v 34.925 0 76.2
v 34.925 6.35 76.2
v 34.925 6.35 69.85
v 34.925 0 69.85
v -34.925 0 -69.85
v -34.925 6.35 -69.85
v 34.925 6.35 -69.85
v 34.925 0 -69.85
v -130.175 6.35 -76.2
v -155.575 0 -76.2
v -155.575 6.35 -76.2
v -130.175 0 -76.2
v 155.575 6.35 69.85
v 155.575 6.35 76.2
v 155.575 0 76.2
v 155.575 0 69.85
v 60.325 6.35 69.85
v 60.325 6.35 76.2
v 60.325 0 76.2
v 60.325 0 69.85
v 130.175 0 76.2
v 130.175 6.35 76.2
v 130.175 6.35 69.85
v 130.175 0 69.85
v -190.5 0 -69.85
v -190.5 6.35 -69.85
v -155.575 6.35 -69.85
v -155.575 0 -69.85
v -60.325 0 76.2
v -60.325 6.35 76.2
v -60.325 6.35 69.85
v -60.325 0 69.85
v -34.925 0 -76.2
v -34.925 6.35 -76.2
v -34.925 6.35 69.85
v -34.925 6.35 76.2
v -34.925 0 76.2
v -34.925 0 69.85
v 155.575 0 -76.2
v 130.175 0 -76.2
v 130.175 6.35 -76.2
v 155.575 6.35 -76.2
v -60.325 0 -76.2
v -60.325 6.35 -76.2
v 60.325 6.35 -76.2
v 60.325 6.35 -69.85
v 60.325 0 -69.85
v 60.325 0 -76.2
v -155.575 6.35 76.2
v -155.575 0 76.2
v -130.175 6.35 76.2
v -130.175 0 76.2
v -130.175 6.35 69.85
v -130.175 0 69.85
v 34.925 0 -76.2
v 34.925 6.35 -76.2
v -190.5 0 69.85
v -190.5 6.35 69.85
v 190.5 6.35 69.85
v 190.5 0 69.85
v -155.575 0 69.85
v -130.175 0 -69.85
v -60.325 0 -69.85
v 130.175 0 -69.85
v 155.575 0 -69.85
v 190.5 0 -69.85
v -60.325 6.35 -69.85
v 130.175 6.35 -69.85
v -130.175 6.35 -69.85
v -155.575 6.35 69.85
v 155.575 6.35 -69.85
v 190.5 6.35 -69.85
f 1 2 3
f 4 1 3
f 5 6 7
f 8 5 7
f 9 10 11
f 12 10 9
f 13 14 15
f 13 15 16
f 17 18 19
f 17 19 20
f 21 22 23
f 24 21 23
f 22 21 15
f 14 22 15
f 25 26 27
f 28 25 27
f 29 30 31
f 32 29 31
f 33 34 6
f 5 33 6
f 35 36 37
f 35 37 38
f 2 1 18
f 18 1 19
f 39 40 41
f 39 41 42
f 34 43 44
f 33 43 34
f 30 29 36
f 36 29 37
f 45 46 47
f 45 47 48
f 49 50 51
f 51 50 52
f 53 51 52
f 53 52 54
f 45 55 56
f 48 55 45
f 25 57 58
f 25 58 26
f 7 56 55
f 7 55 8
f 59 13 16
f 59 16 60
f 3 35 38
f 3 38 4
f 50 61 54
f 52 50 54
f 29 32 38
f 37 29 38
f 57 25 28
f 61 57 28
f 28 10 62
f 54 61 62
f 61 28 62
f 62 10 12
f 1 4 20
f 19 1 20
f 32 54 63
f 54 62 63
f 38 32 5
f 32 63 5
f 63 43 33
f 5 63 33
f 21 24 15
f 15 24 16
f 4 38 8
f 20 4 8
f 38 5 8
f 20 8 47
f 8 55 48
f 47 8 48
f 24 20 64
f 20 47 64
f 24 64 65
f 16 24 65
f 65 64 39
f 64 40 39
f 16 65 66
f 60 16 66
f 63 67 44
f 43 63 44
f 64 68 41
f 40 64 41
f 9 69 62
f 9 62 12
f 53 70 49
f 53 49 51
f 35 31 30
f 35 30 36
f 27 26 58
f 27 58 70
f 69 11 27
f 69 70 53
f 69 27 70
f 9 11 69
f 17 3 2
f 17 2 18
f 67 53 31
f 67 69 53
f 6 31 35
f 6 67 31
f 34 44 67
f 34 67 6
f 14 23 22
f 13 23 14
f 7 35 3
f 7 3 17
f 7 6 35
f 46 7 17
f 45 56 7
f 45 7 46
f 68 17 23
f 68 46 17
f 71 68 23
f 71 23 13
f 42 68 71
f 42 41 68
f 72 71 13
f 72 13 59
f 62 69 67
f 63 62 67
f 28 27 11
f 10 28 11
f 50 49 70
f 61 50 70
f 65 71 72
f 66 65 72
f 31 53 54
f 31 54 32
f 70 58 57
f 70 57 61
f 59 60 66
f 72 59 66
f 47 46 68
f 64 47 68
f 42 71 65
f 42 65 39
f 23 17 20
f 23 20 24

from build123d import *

# Parameters (mm, degrees)
SKETCH1_W               = 381
SKETCH1_H               = 152.4
BOSS_EXTRUDE1_DEPTH     = 6.35
SKETCH2_W               = 69.85
SKETCH2_H               = 6.35
CUT_EXTRUDE2_DEPTH      = 7.35
LPATTERN1_COUNT         = 3
LPATTERN1_PITCH         = 95.25
LPATTERN1_COL_COUNT     = 3
LPATTERN1_COL_PITCH     = 95.25
MIRROR2_COPY_1_SKETCH_W = 69.85
MIRROR2_COPY_1_SKETCH_H = 6.35
MIRROR2_COPY_1_DEPTH    = 7.35
MIRROR2_COPY_2_SKETCH_W = 69.85
MIRROR2_COPY_2_SKETCH_H = 6.35
MIRROR2_COPY_2_DEPTH    = 7.35
MIRROR2_COPY_3_SKETCH_W = 69.85
MIRROR2_COPY_3_SKETCH_H = 6.35
MIRROR2_COPY_3_DEPTH    = 7.35
MIRROR2_COPY_4_SKETCH_W = 69.85
MIRROR2_COPY_4_SKETCH_H = 6.35
MIRROR2_COPY_4_DEPTH    = 7.35


with BuildPart() as part:
    # Sketch1 → Boss-Extrude1 (new body)
    with BuildSketch(Plane(origin=(0, 0, 0), x_dir=(1, 0, 0), z_dir=(0, 1, 0))):
        Rectangle(SKETCH1_W, SKETCH1_H)
    extrude(amount=BOSS_EXTRUDE1_DEPTH)

    # Sketch2 → Cut-Extrude2 (cut, through all)
    with BuildSketch(Plane(origin=(0, 6.35, 0), x_dir=(1, 0, 0), z_dir=(0, 1, 0))):
        with Locations((0, -73.025)):
            Rectangle(SKETCH2_W, SKETCH2_H)
    cut_extrude2 = extrude(amount=-CUT_EXTRUDE2_DEPTH, mode=Mode.SUBTRACT)

    # LPattern1: Cut-Extrude2 ×3
    with Locations(*[(-i * LPATTERN1_PITCH, 0, 0) for i in range(1, LPATTERN1_COUNT)]):
        add(cut_extrude2, mode=Mode.SUBTRACT)

    # LPattern1 col: Cut-Extrude2 ×3
    with Locations(*[(i * LPATTERN1_COL_PITCH, 0, 0) for i in range(1, LPATTERN1_COL_COUNT)]):
        add(cut_extrude2, mode=Mode.SUBTRACT)

    # Mirror2: Cut-Extrude2 across plane
    add(cut_extrude2.mirror(Plane.XY), mode=Mode.SUBTRACT)

    # Mirror2 copy 1 sketch → Mirror2 copy 1 (cut, through all)
    with BuildSketch(Plane(origin=(-95.25, 6.35, 0), x_dir=(1, 0, 0), z_dir=(0, 1, 0))):
        with Locations((0, 73.025)):
            Rectangle(MIRROR2_COPY_1_SKETCH_W, MIRROR2_COPY_1_SKETCH_H)
    extrude(amount=-MIRROR2_COPY_1_DEPTH, mode=Mode.SUBTRACT)

    # Mirror2 copy 2 sketch → Mirror2 copy 2 (cut, through all)
    with BuildSketch(Plane(origin=(-190.5, 6.35, 0), x_dir=(1, 0, 0), z_dir=(0, 1, 0))):
        with Locations((0, 73.025)):
            Rectangle(MIRROR2_COPY_2_SKETCH_W, MIRROR2_COPY_2_SKETCH_H)
    extrude(amount=-MIRROR2_COPY_2_DEPTH, mode=Mode.SUBTRACT)

    # Mirror2 copy 3 sketch → Mirror2 copy 3 (cut, through all)
    with BuildSketch(Plane(origin=(95.25, 6.35, 0), x_dir=(1, 0, 0), z_dir=(0, 1, 0))):
        with Locations((0, 73.025)):
            Rectangle(MIRROR2_COPY_3_SKETCH_W, MIRROR2_COPY_3_SKETCH_H)
    extrude(amount=-MIRROR2_COPY_3_DEPTH, mode=Mode.SUBTRACT)

    # Mirror2 copy 4 sketch → Mirror2 copy 4 (cut, through all)
    with BuildSketch(Plane(origin=(190.5, 6.35, 0), x_dir=(1, 0, 0), z_dir=(0, 1, 0))):
        with Locations((0, 73.025)):
            Rectangle(MIRROR2_COPY_4_SKETCH_W, MIRROR2_COPY_4_SKETCH_H)
    extrude(amount=-MIRROR2_COPY_4_DEPTH, mode=Mode.SUBTRACT)


solid = part.part
